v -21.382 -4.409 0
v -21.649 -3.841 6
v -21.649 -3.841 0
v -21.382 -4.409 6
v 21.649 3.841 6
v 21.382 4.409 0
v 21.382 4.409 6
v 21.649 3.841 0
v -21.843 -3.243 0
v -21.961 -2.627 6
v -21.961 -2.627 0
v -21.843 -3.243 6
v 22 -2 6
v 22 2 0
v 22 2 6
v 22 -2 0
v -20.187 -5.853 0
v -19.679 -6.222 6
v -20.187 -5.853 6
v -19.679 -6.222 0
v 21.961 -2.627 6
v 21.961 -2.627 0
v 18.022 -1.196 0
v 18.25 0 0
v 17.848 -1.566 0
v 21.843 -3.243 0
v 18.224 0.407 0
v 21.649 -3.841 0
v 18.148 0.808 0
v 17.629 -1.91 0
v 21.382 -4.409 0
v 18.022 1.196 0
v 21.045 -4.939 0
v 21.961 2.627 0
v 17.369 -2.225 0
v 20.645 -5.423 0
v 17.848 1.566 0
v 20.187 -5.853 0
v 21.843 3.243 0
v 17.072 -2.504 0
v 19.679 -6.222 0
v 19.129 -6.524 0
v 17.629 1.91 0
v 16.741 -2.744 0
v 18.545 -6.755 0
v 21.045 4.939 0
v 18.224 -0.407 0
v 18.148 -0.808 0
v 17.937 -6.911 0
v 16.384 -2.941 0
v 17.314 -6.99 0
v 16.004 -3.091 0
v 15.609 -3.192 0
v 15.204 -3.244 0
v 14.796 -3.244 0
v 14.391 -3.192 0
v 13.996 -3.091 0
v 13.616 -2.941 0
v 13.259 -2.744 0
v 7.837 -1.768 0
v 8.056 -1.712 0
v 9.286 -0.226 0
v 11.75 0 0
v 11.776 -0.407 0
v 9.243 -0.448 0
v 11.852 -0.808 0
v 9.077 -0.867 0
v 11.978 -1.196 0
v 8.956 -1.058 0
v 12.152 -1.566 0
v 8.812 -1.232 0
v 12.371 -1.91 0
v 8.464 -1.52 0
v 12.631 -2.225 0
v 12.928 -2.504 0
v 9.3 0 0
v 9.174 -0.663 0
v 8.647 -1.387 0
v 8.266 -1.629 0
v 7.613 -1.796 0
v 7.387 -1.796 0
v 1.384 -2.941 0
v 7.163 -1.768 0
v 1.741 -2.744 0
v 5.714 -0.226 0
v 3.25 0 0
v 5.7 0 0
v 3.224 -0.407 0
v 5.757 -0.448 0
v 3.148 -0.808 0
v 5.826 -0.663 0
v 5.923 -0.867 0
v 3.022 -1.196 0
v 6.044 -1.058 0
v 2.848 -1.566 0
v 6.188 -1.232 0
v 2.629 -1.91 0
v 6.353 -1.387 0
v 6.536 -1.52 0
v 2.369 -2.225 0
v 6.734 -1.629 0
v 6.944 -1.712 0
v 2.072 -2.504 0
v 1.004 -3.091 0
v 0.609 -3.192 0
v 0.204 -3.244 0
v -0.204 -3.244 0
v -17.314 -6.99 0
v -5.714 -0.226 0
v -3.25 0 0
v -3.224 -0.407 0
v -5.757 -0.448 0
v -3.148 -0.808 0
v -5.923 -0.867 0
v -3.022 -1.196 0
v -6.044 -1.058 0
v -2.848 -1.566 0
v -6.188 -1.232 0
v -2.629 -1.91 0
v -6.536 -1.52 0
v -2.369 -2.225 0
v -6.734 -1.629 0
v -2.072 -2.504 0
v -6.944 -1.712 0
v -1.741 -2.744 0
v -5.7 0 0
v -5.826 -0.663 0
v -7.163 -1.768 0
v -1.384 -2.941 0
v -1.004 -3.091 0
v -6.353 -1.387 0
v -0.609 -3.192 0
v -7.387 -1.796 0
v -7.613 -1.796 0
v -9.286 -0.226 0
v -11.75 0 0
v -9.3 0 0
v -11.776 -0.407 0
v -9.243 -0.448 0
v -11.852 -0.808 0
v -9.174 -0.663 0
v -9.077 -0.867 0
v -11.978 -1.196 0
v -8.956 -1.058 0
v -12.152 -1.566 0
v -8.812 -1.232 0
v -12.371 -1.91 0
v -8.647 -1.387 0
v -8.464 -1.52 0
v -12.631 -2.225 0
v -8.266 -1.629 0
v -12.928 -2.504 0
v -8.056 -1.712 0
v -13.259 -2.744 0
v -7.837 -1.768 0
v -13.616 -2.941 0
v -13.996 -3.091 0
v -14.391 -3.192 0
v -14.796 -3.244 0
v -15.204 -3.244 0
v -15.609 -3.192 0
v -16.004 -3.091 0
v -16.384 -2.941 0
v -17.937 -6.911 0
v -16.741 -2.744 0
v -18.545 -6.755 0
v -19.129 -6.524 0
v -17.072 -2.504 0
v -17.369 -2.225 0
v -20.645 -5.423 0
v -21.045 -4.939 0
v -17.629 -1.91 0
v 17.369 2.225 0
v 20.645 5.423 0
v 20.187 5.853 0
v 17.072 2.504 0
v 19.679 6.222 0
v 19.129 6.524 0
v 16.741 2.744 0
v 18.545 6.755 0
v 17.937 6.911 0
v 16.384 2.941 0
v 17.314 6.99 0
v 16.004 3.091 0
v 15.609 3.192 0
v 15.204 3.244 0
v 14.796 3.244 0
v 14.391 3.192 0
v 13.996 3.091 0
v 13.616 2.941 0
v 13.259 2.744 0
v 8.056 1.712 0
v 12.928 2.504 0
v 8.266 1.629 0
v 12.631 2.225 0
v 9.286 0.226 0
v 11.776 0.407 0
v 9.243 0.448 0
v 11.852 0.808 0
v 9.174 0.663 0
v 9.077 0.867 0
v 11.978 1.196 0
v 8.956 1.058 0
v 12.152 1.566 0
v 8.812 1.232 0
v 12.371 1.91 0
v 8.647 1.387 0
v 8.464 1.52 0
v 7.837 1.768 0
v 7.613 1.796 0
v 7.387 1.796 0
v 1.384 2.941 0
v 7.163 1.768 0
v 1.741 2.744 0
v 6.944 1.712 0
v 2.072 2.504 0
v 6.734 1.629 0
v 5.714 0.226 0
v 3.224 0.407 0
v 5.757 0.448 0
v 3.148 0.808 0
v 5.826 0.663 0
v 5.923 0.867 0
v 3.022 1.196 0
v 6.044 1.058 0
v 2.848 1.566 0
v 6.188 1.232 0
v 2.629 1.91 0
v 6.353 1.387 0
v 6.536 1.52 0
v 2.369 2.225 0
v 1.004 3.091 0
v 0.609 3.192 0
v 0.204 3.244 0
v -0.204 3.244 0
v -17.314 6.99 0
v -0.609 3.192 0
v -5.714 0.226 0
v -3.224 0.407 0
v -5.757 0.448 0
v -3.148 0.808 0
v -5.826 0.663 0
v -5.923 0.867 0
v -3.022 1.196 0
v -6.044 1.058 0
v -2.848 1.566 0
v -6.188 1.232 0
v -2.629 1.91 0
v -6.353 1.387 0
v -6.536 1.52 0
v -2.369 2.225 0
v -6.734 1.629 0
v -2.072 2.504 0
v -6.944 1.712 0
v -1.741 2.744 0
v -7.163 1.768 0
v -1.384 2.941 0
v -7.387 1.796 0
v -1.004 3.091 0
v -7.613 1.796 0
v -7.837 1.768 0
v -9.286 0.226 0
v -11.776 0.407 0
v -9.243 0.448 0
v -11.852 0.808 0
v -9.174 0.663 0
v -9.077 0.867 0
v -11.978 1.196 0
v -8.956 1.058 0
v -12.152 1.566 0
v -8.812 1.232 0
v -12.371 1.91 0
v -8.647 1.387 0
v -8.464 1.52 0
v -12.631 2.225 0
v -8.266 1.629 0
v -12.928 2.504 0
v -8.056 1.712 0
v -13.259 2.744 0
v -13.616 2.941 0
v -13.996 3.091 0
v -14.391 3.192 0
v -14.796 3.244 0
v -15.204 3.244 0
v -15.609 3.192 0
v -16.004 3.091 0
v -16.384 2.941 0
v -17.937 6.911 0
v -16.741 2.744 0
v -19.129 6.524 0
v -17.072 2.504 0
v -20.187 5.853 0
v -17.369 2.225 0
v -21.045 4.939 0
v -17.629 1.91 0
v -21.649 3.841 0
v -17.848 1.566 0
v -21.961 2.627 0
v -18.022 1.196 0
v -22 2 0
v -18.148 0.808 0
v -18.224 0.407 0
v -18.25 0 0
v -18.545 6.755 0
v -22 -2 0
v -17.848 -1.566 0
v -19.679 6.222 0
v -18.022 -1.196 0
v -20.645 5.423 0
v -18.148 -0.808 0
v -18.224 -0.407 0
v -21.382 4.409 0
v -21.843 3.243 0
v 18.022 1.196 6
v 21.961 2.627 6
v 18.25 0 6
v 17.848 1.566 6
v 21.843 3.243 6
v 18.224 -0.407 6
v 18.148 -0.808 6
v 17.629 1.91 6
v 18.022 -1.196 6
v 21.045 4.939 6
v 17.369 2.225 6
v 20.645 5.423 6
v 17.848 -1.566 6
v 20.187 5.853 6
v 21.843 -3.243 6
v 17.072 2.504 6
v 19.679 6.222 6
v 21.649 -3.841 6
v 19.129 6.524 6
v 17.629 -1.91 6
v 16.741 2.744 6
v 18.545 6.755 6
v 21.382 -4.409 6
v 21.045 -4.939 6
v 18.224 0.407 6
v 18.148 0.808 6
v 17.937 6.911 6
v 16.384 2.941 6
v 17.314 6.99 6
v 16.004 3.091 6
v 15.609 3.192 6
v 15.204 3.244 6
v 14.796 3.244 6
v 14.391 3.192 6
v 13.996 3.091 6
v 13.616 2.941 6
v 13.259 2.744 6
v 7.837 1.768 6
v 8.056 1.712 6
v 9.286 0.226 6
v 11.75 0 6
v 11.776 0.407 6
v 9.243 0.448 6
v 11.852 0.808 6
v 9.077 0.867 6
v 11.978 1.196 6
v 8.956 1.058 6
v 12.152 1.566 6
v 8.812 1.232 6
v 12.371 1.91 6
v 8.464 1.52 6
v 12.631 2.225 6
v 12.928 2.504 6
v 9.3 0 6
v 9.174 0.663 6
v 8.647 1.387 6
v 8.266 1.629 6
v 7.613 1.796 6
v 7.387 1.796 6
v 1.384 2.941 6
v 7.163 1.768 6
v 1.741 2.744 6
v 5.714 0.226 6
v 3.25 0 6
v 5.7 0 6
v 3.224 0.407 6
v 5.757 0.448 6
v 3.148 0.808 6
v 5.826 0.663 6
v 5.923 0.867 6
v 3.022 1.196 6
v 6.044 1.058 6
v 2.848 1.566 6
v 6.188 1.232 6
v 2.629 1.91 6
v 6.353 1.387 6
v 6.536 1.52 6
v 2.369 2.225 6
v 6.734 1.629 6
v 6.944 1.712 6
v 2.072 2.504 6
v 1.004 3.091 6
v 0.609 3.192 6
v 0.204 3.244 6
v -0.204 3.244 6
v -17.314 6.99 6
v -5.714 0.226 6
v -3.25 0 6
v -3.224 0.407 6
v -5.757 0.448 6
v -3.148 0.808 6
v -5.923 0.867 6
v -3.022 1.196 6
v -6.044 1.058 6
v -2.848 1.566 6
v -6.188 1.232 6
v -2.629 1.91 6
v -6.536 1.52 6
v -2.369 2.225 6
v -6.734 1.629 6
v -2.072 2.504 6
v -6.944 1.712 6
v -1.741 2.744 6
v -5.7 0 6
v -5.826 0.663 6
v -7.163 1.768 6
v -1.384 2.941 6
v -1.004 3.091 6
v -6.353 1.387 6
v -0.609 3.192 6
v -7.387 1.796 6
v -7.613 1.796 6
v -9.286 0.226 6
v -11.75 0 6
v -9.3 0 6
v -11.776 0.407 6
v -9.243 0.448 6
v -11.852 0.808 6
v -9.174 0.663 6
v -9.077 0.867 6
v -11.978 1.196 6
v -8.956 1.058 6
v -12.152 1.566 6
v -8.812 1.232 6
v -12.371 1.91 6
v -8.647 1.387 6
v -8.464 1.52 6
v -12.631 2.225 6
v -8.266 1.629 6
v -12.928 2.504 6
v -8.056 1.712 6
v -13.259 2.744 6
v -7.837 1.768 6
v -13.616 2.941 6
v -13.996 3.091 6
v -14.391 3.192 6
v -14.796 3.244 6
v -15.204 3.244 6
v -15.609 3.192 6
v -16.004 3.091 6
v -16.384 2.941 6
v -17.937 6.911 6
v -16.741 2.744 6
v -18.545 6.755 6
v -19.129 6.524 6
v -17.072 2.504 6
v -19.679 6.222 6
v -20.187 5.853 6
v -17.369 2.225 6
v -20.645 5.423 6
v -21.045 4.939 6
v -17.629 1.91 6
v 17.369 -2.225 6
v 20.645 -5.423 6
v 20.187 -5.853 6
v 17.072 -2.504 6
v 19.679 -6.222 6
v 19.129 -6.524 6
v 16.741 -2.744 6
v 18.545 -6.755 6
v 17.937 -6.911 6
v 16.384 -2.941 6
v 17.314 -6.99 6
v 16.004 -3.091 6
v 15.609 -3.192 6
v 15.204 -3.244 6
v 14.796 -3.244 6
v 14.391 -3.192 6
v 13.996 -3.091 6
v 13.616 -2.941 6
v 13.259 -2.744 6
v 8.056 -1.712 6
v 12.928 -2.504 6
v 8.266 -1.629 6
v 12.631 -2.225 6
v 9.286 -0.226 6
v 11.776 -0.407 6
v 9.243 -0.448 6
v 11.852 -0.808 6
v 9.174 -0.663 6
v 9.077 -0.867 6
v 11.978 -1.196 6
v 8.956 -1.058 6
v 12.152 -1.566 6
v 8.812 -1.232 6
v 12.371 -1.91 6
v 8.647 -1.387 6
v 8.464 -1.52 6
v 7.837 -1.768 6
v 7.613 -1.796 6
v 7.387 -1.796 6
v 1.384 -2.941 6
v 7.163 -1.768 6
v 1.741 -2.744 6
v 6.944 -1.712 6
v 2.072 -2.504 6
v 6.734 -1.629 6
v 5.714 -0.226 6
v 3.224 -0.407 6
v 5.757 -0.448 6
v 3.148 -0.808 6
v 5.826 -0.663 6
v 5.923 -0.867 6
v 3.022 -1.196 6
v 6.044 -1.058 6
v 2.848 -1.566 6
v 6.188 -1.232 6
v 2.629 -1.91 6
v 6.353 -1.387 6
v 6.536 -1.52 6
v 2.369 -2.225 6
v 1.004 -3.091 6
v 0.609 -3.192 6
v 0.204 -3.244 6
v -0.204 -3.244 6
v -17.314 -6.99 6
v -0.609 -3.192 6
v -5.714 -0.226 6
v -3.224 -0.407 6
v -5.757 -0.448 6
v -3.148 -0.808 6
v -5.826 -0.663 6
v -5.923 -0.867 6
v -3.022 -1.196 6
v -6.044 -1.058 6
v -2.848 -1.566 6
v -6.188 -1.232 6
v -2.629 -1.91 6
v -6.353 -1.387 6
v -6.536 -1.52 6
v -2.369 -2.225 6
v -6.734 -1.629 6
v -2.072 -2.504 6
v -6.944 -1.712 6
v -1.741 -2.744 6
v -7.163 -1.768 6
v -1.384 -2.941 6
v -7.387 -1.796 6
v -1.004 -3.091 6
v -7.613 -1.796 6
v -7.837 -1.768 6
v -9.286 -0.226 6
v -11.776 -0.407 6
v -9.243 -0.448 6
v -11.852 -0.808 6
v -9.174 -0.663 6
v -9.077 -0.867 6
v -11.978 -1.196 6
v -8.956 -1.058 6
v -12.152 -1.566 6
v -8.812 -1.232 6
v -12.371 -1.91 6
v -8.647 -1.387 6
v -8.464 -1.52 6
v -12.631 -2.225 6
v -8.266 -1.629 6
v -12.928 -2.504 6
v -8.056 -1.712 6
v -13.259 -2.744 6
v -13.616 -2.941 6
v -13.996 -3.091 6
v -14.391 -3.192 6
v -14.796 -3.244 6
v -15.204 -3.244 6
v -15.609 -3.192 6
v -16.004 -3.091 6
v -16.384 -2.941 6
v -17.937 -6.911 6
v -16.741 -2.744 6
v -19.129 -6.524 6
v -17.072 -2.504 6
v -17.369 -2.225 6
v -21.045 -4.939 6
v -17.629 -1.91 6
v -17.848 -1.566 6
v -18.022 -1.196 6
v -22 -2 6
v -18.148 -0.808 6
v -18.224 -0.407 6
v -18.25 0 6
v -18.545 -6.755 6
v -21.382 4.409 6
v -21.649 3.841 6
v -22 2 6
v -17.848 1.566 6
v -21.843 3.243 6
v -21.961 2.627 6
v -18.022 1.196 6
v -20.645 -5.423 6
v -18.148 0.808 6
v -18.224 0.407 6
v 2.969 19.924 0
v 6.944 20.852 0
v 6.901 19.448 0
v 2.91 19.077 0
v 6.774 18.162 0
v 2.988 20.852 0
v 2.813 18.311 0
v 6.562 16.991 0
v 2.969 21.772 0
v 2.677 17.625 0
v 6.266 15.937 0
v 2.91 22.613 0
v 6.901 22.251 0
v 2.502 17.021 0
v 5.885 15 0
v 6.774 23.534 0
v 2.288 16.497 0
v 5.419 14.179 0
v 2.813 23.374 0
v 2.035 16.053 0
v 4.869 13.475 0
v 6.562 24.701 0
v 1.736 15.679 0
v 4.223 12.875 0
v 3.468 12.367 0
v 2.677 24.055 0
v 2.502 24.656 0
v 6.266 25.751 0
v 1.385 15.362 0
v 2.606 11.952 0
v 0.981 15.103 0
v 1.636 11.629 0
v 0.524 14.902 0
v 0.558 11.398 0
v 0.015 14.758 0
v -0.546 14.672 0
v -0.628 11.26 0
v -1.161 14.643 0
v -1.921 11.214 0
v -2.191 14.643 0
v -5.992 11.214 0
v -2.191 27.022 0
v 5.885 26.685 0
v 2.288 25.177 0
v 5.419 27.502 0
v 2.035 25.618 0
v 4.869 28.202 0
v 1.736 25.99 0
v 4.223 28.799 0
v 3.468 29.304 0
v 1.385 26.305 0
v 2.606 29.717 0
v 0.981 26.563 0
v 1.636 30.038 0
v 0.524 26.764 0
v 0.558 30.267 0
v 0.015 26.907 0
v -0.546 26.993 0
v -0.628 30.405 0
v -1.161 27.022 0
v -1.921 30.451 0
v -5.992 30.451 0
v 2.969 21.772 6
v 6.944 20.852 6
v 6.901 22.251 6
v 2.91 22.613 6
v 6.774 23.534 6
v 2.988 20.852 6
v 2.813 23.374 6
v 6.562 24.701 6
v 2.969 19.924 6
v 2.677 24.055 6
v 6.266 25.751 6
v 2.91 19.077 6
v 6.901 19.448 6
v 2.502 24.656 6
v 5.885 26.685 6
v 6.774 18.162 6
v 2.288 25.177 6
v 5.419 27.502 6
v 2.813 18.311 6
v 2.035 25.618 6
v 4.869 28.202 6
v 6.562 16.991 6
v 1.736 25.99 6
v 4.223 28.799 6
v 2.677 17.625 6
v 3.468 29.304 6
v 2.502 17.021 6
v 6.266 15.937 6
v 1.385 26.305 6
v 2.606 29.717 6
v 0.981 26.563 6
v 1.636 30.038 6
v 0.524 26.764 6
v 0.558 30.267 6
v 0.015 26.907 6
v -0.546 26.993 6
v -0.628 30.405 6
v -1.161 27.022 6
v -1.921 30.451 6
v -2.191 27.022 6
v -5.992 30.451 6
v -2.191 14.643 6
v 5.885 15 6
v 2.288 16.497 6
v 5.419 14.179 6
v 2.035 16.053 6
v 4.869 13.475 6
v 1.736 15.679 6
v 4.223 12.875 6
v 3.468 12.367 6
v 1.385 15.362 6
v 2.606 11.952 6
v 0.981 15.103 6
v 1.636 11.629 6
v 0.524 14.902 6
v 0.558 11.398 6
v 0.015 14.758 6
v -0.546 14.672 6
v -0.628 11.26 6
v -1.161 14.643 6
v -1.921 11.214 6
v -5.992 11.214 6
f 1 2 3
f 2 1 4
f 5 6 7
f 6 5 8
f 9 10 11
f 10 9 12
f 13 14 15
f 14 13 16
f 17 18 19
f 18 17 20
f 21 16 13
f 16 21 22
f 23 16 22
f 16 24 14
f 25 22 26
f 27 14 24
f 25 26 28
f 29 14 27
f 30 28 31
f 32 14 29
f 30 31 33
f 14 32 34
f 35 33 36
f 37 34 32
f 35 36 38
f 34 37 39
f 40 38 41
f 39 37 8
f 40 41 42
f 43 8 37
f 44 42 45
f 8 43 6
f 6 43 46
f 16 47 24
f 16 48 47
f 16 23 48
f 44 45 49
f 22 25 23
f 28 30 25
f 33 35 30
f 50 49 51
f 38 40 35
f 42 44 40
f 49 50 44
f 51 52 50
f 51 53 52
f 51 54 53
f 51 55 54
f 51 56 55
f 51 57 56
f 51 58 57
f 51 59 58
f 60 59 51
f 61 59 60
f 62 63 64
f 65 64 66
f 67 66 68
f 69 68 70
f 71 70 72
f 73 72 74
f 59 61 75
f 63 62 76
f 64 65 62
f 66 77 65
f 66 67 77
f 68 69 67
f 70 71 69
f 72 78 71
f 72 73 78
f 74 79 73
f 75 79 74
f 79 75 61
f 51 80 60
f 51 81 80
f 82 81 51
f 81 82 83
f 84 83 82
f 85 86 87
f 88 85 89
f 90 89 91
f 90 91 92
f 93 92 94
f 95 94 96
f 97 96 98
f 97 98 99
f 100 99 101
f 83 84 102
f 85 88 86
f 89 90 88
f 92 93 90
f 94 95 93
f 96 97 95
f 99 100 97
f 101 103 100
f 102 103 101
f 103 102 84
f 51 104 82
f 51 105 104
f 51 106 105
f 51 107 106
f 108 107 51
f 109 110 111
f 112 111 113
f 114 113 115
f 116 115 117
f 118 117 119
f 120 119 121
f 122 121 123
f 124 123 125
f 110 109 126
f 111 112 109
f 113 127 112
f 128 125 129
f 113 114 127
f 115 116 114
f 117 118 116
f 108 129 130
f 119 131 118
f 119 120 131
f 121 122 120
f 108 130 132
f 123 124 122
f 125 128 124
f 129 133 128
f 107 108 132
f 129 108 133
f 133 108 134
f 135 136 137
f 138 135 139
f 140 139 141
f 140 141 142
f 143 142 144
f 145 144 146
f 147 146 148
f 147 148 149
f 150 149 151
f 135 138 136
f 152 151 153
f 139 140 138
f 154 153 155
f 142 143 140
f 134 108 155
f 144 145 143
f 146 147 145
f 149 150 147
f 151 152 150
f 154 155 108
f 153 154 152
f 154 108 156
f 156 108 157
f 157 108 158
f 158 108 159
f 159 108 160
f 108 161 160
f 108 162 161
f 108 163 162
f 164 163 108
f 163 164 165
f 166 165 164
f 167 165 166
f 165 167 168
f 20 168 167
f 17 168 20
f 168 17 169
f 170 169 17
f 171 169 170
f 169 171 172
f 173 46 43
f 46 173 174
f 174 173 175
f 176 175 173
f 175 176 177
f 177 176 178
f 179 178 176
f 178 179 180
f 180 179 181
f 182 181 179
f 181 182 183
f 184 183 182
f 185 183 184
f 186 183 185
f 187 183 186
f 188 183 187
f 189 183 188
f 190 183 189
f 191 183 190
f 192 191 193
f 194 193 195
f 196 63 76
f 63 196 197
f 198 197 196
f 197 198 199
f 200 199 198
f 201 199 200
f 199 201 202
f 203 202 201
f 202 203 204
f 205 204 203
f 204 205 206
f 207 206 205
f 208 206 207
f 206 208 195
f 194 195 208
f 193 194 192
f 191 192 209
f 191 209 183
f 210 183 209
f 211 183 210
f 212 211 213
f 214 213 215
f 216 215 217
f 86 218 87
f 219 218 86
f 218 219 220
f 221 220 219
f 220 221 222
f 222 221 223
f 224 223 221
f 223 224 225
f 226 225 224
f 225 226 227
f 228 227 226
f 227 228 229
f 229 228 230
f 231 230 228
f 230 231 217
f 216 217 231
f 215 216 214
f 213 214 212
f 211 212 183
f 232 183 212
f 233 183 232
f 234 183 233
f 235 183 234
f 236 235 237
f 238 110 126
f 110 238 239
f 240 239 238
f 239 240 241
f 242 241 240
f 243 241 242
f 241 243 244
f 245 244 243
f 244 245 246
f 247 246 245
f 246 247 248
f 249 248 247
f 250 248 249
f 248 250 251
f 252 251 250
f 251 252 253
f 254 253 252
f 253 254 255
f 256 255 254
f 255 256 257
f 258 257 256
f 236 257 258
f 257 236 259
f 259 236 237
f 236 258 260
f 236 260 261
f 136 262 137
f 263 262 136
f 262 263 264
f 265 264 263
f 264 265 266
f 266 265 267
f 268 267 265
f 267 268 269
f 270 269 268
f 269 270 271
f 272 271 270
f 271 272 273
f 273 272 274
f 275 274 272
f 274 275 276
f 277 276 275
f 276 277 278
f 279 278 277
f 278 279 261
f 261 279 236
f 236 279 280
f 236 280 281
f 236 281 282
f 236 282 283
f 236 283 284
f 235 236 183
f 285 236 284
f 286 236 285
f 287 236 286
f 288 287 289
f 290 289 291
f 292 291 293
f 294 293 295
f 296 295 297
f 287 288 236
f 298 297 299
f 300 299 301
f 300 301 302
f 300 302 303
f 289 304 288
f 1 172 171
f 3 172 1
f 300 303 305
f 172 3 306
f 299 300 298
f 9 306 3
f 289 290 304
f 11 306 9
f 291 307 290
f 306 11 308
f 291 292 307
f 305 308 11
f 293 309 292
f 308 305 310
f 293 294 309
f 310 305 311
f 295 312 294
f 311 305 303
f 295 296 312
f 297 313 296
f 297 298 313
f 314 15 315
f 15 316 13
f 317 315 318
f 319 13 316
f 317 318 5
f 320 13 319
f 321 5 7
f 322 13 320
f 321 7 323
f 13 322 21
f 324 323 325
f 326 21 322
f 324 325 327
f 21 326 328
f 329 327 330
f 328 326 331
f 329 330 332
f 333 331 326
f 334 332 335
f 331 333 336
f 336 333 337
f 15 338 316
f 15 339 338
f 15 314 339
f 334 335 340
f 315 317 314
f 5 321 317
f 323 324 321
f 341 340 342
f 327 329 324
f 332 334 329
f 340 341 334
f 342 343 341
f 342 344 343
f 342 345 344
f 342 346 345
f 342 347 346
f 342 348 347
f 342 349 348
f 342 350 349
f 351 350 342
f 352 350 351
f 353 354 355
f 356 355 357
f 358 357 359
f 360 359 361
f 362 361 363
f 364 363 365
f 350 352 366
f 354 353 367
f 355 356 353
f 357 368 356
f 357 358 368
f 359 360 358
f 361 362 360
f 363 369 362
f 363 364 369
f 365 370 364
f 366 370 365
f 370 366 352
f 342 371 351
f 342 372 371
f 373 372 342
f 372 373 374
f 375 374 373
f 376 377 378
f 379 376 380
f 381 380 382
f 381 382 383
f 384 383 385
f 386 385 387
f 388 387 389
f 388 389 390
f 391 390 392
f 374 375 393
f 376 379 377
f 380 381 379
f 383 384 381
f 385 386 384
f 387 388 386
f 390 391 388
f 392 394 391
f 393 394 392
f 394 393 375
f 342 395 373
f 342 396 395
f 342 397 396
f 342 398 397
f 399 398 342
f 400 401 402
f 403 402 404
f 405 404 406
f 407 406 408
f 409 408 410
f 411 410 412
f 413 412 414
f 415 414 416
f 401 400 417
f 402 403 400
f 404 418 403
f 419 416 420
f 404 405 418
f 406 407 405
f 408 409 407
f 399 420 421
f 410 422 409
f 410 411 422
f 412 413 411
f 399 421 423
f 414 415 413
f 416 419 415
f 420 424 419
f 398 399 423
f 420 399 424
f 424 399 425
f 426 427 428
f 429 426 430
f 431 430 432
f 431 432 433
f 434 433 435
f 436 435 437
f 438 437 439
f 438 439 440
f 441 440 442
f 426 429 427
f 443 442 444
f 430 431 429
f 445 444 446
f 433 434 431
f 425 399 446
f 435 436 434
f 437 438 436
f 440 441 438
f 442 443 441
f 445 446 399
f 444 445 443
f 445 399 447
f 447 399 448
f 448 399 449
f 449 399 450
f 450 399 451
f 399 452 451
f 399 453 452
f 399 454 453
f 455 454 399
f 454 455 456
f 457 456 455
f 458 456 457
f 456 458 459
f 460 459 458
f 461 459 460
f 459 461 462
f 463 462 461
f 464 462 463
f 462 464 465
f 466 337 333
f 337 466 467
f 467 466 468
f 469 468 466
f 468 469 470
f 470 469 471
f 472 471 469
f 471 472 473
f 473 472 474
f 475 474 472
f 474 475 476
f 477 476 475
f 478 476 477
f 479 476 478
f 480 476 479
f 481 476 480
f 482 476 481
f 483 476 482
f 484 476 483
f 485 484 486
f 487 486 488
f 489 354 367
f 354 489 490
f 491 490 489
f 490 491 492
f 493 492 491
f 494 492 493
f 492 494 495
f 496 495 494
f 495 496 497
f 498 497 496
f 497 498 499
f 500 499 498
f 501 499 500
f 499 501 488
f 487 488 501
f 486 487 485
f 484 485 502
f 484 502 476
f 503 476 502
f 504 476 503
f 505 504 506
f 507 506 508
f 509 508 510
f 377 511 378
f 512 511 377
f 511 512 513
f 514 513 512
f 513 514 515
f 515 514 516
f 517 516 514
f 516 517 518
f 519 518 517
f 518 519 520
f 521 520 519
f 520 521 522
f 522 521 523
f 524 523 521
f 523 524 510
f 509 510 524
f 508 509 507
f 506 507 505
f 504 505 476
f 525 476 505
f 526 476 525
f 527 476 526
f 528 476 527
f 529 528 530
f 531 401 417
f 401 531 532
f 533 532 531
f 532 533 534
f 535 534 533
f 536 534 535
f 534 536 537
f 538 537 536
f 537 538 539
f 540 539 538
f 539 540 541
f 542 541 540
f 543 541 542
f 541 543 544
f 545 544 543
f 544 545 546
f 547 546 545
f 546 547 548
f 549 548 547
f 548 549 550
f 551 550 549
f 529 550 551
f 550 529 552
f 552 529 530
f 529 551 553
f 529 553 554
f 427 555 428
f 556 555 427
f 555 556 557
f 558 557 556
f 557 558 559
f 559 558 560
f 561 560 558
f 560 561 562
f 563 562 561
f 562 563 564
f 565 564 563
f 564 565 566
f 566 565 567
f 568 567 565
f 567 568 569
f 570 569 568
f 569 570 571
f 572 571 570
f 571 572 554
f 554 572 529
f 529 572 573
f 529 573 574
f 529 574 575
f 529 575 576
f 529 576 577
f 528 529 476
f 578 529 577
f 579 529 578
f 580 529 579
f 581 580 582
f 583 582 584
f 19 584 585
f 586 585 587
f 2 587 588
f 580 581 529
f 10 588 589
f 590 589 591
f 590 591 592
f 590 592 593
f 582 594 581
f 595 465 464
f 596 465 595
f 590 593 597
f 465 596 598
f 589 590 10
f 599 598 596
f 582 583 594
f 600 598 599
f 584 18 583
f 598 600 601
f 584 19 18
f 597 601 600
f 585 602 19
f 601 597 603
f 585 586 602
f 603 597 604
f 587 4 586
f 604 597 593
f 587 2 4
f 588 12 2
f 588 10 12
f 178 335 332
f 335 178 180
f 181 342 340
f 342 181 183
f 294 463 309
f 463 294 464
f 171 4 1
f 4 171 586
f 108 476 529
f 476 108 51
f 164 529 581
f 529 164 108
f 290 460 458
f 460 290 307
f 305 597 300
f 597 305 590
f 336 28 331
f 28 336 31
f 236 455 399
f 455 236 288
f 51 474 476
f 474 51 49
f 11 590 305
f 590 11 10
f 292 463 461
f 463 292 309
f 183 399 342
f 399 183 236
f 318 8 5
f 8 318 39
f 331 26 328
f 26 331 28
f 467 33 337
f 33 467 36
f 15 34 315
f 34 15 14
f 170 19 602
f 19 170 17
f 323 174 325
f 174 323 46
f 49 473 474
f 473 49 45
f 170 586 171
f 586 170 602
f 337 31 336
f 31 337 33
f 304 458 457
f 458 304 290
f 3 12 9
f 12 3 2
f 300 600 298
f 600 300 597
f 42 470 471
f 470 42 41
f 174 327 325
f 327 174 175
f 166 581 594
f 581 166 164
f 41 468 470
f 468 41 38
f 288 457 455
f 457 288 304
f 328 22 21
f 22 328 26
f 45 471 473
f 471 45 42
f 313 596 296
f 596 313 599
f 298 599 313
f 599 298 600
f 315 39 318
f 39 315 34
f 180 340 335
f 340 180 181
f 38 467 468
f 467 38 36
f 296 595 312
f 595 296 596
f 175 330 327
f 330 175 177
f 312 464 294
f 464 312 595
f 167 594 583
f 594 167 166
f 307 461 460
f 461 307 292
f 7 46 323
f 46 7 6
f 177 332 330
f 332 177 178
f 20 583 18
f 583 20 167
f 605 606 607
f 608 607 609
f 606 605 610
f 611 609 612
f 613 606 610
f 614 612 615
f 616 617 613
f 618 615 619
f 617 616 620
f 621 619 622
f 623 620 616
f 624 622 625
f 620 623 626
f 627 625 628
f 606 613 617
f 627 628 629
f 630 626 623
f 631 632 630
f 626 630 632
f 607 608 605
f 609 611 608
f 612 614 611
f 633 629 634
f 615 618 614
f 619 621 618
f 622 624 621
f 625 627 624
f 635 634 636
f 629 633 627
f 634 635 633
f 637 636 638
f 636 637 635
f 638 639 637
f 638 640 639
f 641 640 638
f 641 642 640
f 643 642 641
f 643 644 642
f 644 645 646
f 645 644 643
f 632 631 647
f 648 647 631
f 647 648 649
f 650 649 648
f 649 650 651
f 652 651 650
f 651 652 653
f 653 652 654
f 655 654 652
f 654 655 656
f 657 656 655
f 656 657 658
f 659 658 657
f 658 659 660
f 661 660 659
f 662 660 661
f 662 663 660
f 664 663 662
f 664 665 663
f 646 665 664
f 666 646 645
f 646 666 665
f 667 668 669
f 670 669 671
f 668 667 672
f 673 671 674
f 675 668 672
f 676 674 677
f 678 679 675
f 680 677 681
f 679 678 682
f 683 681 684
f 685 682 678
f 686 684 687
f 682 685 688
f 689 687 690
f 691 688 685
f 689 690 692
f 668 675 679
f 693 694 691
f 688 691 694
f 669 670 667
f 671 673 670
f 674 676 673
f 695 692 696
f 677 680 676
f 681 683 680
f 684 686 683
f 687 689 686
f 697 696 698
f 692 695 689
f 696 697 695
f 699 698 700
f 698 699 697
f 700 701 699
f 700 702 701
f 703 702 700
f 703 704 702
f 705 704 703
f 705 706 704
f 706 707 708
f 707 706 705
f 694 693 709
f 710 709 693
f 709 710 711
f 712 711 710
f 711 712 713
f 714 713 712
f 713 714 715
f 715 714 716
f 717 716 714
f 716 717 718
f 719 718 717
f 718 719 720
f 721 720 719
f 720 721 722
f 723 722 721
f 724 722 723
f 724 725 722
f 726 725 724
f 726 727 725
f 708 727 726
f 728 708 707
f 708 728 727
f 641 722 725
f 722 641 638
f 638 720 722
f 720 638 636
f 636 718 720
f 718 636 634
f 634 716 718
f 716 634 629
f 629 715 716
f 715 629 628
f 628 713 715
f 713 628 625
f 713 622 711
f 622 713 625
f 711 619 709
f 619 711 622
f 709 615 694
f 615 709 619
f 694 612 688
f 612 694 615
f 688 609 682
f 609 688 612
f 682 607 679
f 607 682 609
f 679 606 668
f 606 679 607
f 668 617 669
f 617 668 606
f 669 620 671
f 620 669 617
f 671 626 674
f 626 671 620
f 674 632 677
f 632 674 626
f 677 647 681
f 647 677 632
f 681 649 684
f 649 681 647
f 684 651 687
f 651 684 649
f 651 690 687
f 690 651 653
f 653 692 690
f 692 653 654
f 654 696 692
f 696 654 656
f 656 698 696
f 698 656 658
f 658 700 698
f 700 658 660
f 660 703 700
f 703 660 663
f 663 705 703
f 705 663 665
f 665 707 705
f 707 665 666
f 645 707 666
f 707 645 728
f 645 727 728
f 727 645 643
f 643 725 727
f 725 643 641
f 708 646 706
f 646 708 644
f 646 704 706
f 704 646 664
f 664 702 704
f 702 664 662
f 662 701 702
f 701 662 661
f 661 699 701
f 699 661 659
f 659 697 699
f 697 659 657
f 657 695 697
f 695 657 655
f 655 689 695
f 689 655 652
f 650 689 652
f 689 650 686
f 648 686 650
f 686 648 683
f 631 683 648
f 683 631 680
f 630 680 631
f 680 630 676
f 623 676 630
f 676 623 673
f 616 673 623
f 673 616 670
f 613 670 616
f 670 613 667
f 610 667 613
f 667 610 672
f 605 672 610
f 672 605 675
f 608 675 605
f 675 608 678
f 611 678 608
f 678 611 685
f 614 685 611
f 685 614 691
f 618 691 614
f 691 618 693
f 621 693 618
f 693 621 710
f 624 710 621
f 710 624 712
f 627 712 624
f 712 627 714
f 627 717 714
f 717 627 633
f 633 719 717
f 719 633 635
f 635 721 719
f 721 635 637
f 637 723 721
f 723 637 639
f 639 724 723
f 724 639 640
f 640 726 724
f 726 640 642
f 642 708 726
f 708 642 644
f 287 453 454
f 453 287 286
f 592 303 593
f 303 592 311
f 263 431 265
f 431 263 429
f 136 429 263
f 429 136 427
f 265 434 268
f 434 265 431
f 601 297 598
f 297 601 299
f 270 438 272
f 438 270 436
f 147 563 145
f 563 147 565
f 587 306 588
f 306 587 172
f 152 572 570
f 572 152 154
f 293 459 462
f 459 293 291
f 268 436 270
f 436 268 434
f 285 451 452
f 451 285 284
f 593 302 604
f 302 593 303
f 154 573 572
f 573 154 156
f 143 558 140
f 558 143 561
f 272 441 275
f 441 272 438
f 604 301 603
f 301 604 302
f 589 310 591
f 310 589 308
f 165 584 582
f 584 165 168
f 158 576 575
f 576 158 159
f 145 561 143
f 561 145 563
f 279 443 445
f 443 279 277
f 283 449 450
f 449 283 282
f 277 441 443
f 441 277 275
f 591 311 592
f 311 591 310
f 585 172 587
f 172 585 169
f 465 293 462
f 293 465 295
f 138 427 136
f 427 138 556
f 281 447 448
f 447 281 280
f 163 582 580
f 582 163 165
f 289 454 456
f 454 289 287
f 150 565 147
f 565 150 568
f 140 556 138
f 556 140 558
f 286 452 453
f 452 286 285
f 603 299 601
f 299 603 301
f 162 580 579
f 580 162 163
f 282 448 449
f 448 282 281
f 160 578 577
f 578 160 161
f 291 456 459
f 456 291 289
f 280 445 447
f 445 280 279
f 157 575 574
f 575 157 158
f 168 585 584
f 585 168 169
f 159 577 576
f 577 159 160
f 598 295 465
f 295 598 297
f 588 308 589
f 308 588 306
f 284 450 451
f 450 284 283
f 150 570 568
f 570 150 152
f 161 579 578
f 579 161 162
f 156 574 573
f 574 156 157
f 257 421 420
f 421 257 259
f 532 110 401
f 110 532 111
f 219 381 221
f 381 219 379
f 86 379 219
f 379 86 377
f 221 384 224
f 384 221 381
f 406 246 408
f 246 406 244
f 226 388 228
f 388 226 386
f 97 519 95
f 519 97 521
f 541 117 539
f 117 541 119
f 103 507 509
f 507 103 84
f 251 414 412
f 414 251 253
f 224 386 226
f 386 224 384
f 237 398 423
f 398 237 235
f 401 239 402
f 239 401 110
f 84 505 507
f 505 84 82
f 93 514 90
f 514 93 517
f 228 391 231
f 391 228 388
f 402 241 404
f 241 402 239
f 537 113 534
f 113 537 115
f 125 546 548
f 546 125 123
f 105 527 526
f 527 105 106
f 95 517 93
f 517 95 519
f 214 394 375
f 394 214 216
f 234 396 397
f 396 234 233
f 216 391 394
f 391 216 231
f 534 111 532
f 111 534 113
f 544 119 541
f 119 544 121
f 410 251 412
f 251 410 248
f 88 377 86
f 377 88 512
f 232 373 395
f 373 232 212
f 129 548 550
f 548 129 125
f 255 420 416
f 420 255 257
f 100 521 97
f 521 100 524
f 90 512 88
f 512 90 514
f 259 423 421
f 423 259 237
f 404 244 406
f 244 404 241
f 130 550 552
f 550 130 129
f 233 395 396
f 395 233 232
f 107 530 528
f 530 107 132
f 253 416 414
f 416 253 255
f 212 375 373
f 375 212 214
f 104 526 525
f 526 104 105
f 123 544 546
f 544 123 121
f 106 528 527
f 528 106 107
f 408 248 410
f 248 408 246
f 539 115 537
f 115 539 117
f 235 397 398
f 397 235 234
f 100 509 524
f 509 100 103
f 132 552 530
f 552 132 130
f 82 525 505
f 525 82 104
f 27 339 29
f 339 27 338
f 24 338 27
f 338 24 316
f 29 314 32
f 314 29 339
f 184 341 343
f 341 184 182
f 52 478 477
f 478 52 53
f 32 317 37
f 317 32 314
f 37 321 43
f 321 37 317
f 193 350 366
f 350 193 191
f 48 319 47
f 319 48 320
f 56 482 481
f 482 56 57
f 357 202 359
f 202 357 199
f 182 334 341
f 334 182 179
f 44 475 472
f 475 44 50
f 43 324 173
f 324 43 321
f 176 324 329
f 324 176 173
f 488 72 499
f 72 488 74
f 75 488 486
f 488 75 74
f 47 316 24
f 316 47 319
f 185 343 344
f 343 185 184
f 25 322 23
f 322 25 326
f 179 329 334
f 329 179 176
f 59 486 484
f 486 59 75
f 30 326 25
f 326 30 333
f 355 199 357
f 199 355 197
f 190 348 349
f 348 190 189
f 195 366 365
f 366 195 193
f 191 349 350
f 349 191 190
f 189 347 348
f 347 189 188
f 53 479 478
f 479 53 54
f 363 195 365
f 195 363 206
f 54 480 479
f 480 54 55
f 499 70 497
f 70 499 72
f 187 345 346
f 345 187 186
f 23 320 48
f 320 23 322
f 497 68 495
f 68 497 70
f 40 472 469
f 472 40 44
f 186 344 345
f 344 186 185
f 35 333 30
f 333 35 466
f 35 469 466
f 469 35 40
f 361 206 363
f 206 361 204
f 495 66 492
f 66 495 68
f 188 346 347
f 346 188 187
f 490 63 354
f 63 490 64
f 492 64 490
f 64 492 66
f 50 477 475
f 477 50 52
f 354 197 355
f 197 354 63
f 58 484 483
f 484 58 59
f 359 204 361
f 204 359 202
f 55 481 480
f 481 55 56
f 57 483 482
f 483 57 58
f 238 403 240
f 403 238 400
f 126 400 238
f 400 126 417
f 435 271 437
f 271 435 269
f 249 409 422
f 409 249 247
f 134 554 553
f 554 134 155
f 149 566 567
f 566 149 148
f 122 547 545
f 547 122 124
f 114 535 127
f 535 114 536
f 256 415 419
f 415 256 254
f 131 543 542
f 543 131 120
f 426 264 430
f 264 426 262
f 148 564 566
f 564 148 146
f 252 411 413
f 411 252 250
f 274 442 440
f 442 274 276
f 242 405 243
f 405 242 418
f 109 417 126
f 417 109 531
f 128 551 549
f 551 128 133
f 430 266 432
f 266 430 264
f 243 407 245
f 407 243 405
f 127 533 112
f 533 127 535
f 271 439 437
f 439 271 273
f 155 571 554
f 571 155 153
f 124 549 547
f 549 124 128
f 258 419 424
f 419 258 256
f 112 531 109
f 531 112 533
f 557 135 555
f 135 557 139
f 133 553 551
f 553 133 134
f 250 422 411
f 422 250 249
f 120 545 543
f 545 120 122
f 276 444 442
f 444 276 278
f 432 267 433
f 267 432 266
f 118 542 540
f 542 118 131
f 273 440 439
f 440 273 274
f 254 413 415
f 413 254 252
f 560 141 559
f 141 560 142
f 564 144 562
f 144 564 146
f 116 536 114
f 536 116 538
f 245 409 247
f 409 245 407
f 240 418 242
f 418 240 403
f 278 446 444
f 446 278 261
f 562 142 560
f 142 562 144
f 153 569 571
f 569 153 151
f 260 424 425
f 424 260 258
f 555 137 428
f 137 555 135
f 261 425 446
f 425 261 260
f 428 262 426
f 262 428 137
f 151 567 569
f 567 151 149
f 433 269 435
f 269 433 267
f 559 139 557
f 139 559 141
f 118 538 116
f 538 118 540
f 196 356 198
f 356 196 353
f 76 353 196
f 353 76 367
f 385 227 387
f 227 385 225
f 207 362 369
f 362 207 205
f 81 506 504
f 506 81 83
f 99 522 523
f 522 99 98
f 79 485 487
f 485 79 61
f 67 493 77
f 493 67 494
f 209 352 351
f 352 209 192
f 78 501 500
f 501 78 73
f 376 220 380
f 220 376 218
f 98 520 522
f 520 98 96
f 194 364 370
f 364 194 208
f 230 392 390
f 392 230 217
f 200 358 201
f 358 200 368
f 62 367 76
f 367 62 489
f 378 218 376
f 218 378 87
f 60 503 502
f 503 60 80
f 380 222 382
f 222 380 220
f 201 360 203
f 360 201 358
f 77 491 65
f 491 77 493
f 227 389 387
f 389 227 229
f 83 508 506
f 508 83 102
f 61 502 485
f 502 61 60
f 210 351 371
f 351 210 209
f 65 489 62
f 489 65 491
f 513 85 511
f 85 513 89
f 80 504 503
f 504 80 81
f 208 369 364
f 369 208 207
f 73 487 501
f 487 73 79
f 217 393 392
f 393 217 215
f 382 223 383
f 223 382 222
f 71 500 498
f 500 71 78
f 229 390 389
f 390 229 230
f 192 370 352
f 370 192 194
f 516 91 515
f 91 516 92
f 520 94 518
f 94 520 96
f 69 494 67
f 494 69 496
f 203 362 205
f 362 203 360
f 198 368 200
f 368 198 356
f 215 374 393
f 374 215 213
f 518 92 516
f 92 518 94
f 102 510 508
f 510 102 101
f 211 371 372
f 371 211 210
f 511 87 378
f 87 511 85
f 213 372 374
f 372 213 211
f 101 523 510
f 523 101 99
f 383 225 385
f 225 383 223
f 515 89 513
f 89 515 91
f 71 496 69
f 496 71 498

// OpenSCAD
$fn = 50;


difference() {
	union() {
		hull() {
			translate(v = [-17.0000000000, 2.0000000000, 0]) {
				cylinder(h = 6, r = 5);
			}
			translate(v = [17.0000000000, 2.0000000000, 0]) {
				cylinder(h = 6, r = 5);
			}
			translate(v = [-17.0000000000, -2.0000000000, 0]) {
				cylinder(h = 6, r = 5);
			}
			translate(v = [17.0000000000, -2.0000000000, 0]) {
				cylinder(h = 6, r = 5);
			}
		}
		translate(v = [0, 30.0000000000, 0]) {
			linear_extrude(height = 6) {
				text(font = "DejaVu Sans Mono:style=Bold", halign = "center", size = 19.0000000000, text = "D", valign = "top");
			}
		}
	}
	union() {
		translate(v = [-15.0000000000, 0.0000000000, 0]) {
			translate(v = [0, 0, -100]) {
				cylinder(h = 200, r = 3.2500000000);
			}
		}
		translate(v = [0, 0, -100]) {
			cylinder(h = 200, r = 3.2500000000);
		}
		translate(v = [15.0000000000, 0.0000000000, 0]) {
			translate(v = [0, 0, -100]) {
				cylinder(h = 200, r = 3.2500000000);
			}
		}
		translate(v = [-15.0000000000, 0.0000000000, 0]) {
			translate(v = [0, 0, -100]) {
				cylinder(h = 200, r = 1.8000000000);
			}
		}
		translate(v = [-7.5000000000, 0.0000000000, 0]) {
			translate(v = [0, 0, -100]) {
				cylinder(h = 200, r = 1.8000000000);
			}
		}
		translate(v = [0, 0, -100]) {
			cylinder(h = 200, r = 1.8000000000);
		}
		translate(v = [7.5000000000, 0.0000000000, 0]) {
			translate(v = [0, 0, -100]) {
				cylinder(h = 200, r = 1.8000000000);
			}
		}
		translate(v = [15.0000000000, 0.0000000000, 0]) {
			translate(v = [0, 0, -100]) {
				cylinder(h = 200, r = 1.8000000000);
			}
		}
	}
}
